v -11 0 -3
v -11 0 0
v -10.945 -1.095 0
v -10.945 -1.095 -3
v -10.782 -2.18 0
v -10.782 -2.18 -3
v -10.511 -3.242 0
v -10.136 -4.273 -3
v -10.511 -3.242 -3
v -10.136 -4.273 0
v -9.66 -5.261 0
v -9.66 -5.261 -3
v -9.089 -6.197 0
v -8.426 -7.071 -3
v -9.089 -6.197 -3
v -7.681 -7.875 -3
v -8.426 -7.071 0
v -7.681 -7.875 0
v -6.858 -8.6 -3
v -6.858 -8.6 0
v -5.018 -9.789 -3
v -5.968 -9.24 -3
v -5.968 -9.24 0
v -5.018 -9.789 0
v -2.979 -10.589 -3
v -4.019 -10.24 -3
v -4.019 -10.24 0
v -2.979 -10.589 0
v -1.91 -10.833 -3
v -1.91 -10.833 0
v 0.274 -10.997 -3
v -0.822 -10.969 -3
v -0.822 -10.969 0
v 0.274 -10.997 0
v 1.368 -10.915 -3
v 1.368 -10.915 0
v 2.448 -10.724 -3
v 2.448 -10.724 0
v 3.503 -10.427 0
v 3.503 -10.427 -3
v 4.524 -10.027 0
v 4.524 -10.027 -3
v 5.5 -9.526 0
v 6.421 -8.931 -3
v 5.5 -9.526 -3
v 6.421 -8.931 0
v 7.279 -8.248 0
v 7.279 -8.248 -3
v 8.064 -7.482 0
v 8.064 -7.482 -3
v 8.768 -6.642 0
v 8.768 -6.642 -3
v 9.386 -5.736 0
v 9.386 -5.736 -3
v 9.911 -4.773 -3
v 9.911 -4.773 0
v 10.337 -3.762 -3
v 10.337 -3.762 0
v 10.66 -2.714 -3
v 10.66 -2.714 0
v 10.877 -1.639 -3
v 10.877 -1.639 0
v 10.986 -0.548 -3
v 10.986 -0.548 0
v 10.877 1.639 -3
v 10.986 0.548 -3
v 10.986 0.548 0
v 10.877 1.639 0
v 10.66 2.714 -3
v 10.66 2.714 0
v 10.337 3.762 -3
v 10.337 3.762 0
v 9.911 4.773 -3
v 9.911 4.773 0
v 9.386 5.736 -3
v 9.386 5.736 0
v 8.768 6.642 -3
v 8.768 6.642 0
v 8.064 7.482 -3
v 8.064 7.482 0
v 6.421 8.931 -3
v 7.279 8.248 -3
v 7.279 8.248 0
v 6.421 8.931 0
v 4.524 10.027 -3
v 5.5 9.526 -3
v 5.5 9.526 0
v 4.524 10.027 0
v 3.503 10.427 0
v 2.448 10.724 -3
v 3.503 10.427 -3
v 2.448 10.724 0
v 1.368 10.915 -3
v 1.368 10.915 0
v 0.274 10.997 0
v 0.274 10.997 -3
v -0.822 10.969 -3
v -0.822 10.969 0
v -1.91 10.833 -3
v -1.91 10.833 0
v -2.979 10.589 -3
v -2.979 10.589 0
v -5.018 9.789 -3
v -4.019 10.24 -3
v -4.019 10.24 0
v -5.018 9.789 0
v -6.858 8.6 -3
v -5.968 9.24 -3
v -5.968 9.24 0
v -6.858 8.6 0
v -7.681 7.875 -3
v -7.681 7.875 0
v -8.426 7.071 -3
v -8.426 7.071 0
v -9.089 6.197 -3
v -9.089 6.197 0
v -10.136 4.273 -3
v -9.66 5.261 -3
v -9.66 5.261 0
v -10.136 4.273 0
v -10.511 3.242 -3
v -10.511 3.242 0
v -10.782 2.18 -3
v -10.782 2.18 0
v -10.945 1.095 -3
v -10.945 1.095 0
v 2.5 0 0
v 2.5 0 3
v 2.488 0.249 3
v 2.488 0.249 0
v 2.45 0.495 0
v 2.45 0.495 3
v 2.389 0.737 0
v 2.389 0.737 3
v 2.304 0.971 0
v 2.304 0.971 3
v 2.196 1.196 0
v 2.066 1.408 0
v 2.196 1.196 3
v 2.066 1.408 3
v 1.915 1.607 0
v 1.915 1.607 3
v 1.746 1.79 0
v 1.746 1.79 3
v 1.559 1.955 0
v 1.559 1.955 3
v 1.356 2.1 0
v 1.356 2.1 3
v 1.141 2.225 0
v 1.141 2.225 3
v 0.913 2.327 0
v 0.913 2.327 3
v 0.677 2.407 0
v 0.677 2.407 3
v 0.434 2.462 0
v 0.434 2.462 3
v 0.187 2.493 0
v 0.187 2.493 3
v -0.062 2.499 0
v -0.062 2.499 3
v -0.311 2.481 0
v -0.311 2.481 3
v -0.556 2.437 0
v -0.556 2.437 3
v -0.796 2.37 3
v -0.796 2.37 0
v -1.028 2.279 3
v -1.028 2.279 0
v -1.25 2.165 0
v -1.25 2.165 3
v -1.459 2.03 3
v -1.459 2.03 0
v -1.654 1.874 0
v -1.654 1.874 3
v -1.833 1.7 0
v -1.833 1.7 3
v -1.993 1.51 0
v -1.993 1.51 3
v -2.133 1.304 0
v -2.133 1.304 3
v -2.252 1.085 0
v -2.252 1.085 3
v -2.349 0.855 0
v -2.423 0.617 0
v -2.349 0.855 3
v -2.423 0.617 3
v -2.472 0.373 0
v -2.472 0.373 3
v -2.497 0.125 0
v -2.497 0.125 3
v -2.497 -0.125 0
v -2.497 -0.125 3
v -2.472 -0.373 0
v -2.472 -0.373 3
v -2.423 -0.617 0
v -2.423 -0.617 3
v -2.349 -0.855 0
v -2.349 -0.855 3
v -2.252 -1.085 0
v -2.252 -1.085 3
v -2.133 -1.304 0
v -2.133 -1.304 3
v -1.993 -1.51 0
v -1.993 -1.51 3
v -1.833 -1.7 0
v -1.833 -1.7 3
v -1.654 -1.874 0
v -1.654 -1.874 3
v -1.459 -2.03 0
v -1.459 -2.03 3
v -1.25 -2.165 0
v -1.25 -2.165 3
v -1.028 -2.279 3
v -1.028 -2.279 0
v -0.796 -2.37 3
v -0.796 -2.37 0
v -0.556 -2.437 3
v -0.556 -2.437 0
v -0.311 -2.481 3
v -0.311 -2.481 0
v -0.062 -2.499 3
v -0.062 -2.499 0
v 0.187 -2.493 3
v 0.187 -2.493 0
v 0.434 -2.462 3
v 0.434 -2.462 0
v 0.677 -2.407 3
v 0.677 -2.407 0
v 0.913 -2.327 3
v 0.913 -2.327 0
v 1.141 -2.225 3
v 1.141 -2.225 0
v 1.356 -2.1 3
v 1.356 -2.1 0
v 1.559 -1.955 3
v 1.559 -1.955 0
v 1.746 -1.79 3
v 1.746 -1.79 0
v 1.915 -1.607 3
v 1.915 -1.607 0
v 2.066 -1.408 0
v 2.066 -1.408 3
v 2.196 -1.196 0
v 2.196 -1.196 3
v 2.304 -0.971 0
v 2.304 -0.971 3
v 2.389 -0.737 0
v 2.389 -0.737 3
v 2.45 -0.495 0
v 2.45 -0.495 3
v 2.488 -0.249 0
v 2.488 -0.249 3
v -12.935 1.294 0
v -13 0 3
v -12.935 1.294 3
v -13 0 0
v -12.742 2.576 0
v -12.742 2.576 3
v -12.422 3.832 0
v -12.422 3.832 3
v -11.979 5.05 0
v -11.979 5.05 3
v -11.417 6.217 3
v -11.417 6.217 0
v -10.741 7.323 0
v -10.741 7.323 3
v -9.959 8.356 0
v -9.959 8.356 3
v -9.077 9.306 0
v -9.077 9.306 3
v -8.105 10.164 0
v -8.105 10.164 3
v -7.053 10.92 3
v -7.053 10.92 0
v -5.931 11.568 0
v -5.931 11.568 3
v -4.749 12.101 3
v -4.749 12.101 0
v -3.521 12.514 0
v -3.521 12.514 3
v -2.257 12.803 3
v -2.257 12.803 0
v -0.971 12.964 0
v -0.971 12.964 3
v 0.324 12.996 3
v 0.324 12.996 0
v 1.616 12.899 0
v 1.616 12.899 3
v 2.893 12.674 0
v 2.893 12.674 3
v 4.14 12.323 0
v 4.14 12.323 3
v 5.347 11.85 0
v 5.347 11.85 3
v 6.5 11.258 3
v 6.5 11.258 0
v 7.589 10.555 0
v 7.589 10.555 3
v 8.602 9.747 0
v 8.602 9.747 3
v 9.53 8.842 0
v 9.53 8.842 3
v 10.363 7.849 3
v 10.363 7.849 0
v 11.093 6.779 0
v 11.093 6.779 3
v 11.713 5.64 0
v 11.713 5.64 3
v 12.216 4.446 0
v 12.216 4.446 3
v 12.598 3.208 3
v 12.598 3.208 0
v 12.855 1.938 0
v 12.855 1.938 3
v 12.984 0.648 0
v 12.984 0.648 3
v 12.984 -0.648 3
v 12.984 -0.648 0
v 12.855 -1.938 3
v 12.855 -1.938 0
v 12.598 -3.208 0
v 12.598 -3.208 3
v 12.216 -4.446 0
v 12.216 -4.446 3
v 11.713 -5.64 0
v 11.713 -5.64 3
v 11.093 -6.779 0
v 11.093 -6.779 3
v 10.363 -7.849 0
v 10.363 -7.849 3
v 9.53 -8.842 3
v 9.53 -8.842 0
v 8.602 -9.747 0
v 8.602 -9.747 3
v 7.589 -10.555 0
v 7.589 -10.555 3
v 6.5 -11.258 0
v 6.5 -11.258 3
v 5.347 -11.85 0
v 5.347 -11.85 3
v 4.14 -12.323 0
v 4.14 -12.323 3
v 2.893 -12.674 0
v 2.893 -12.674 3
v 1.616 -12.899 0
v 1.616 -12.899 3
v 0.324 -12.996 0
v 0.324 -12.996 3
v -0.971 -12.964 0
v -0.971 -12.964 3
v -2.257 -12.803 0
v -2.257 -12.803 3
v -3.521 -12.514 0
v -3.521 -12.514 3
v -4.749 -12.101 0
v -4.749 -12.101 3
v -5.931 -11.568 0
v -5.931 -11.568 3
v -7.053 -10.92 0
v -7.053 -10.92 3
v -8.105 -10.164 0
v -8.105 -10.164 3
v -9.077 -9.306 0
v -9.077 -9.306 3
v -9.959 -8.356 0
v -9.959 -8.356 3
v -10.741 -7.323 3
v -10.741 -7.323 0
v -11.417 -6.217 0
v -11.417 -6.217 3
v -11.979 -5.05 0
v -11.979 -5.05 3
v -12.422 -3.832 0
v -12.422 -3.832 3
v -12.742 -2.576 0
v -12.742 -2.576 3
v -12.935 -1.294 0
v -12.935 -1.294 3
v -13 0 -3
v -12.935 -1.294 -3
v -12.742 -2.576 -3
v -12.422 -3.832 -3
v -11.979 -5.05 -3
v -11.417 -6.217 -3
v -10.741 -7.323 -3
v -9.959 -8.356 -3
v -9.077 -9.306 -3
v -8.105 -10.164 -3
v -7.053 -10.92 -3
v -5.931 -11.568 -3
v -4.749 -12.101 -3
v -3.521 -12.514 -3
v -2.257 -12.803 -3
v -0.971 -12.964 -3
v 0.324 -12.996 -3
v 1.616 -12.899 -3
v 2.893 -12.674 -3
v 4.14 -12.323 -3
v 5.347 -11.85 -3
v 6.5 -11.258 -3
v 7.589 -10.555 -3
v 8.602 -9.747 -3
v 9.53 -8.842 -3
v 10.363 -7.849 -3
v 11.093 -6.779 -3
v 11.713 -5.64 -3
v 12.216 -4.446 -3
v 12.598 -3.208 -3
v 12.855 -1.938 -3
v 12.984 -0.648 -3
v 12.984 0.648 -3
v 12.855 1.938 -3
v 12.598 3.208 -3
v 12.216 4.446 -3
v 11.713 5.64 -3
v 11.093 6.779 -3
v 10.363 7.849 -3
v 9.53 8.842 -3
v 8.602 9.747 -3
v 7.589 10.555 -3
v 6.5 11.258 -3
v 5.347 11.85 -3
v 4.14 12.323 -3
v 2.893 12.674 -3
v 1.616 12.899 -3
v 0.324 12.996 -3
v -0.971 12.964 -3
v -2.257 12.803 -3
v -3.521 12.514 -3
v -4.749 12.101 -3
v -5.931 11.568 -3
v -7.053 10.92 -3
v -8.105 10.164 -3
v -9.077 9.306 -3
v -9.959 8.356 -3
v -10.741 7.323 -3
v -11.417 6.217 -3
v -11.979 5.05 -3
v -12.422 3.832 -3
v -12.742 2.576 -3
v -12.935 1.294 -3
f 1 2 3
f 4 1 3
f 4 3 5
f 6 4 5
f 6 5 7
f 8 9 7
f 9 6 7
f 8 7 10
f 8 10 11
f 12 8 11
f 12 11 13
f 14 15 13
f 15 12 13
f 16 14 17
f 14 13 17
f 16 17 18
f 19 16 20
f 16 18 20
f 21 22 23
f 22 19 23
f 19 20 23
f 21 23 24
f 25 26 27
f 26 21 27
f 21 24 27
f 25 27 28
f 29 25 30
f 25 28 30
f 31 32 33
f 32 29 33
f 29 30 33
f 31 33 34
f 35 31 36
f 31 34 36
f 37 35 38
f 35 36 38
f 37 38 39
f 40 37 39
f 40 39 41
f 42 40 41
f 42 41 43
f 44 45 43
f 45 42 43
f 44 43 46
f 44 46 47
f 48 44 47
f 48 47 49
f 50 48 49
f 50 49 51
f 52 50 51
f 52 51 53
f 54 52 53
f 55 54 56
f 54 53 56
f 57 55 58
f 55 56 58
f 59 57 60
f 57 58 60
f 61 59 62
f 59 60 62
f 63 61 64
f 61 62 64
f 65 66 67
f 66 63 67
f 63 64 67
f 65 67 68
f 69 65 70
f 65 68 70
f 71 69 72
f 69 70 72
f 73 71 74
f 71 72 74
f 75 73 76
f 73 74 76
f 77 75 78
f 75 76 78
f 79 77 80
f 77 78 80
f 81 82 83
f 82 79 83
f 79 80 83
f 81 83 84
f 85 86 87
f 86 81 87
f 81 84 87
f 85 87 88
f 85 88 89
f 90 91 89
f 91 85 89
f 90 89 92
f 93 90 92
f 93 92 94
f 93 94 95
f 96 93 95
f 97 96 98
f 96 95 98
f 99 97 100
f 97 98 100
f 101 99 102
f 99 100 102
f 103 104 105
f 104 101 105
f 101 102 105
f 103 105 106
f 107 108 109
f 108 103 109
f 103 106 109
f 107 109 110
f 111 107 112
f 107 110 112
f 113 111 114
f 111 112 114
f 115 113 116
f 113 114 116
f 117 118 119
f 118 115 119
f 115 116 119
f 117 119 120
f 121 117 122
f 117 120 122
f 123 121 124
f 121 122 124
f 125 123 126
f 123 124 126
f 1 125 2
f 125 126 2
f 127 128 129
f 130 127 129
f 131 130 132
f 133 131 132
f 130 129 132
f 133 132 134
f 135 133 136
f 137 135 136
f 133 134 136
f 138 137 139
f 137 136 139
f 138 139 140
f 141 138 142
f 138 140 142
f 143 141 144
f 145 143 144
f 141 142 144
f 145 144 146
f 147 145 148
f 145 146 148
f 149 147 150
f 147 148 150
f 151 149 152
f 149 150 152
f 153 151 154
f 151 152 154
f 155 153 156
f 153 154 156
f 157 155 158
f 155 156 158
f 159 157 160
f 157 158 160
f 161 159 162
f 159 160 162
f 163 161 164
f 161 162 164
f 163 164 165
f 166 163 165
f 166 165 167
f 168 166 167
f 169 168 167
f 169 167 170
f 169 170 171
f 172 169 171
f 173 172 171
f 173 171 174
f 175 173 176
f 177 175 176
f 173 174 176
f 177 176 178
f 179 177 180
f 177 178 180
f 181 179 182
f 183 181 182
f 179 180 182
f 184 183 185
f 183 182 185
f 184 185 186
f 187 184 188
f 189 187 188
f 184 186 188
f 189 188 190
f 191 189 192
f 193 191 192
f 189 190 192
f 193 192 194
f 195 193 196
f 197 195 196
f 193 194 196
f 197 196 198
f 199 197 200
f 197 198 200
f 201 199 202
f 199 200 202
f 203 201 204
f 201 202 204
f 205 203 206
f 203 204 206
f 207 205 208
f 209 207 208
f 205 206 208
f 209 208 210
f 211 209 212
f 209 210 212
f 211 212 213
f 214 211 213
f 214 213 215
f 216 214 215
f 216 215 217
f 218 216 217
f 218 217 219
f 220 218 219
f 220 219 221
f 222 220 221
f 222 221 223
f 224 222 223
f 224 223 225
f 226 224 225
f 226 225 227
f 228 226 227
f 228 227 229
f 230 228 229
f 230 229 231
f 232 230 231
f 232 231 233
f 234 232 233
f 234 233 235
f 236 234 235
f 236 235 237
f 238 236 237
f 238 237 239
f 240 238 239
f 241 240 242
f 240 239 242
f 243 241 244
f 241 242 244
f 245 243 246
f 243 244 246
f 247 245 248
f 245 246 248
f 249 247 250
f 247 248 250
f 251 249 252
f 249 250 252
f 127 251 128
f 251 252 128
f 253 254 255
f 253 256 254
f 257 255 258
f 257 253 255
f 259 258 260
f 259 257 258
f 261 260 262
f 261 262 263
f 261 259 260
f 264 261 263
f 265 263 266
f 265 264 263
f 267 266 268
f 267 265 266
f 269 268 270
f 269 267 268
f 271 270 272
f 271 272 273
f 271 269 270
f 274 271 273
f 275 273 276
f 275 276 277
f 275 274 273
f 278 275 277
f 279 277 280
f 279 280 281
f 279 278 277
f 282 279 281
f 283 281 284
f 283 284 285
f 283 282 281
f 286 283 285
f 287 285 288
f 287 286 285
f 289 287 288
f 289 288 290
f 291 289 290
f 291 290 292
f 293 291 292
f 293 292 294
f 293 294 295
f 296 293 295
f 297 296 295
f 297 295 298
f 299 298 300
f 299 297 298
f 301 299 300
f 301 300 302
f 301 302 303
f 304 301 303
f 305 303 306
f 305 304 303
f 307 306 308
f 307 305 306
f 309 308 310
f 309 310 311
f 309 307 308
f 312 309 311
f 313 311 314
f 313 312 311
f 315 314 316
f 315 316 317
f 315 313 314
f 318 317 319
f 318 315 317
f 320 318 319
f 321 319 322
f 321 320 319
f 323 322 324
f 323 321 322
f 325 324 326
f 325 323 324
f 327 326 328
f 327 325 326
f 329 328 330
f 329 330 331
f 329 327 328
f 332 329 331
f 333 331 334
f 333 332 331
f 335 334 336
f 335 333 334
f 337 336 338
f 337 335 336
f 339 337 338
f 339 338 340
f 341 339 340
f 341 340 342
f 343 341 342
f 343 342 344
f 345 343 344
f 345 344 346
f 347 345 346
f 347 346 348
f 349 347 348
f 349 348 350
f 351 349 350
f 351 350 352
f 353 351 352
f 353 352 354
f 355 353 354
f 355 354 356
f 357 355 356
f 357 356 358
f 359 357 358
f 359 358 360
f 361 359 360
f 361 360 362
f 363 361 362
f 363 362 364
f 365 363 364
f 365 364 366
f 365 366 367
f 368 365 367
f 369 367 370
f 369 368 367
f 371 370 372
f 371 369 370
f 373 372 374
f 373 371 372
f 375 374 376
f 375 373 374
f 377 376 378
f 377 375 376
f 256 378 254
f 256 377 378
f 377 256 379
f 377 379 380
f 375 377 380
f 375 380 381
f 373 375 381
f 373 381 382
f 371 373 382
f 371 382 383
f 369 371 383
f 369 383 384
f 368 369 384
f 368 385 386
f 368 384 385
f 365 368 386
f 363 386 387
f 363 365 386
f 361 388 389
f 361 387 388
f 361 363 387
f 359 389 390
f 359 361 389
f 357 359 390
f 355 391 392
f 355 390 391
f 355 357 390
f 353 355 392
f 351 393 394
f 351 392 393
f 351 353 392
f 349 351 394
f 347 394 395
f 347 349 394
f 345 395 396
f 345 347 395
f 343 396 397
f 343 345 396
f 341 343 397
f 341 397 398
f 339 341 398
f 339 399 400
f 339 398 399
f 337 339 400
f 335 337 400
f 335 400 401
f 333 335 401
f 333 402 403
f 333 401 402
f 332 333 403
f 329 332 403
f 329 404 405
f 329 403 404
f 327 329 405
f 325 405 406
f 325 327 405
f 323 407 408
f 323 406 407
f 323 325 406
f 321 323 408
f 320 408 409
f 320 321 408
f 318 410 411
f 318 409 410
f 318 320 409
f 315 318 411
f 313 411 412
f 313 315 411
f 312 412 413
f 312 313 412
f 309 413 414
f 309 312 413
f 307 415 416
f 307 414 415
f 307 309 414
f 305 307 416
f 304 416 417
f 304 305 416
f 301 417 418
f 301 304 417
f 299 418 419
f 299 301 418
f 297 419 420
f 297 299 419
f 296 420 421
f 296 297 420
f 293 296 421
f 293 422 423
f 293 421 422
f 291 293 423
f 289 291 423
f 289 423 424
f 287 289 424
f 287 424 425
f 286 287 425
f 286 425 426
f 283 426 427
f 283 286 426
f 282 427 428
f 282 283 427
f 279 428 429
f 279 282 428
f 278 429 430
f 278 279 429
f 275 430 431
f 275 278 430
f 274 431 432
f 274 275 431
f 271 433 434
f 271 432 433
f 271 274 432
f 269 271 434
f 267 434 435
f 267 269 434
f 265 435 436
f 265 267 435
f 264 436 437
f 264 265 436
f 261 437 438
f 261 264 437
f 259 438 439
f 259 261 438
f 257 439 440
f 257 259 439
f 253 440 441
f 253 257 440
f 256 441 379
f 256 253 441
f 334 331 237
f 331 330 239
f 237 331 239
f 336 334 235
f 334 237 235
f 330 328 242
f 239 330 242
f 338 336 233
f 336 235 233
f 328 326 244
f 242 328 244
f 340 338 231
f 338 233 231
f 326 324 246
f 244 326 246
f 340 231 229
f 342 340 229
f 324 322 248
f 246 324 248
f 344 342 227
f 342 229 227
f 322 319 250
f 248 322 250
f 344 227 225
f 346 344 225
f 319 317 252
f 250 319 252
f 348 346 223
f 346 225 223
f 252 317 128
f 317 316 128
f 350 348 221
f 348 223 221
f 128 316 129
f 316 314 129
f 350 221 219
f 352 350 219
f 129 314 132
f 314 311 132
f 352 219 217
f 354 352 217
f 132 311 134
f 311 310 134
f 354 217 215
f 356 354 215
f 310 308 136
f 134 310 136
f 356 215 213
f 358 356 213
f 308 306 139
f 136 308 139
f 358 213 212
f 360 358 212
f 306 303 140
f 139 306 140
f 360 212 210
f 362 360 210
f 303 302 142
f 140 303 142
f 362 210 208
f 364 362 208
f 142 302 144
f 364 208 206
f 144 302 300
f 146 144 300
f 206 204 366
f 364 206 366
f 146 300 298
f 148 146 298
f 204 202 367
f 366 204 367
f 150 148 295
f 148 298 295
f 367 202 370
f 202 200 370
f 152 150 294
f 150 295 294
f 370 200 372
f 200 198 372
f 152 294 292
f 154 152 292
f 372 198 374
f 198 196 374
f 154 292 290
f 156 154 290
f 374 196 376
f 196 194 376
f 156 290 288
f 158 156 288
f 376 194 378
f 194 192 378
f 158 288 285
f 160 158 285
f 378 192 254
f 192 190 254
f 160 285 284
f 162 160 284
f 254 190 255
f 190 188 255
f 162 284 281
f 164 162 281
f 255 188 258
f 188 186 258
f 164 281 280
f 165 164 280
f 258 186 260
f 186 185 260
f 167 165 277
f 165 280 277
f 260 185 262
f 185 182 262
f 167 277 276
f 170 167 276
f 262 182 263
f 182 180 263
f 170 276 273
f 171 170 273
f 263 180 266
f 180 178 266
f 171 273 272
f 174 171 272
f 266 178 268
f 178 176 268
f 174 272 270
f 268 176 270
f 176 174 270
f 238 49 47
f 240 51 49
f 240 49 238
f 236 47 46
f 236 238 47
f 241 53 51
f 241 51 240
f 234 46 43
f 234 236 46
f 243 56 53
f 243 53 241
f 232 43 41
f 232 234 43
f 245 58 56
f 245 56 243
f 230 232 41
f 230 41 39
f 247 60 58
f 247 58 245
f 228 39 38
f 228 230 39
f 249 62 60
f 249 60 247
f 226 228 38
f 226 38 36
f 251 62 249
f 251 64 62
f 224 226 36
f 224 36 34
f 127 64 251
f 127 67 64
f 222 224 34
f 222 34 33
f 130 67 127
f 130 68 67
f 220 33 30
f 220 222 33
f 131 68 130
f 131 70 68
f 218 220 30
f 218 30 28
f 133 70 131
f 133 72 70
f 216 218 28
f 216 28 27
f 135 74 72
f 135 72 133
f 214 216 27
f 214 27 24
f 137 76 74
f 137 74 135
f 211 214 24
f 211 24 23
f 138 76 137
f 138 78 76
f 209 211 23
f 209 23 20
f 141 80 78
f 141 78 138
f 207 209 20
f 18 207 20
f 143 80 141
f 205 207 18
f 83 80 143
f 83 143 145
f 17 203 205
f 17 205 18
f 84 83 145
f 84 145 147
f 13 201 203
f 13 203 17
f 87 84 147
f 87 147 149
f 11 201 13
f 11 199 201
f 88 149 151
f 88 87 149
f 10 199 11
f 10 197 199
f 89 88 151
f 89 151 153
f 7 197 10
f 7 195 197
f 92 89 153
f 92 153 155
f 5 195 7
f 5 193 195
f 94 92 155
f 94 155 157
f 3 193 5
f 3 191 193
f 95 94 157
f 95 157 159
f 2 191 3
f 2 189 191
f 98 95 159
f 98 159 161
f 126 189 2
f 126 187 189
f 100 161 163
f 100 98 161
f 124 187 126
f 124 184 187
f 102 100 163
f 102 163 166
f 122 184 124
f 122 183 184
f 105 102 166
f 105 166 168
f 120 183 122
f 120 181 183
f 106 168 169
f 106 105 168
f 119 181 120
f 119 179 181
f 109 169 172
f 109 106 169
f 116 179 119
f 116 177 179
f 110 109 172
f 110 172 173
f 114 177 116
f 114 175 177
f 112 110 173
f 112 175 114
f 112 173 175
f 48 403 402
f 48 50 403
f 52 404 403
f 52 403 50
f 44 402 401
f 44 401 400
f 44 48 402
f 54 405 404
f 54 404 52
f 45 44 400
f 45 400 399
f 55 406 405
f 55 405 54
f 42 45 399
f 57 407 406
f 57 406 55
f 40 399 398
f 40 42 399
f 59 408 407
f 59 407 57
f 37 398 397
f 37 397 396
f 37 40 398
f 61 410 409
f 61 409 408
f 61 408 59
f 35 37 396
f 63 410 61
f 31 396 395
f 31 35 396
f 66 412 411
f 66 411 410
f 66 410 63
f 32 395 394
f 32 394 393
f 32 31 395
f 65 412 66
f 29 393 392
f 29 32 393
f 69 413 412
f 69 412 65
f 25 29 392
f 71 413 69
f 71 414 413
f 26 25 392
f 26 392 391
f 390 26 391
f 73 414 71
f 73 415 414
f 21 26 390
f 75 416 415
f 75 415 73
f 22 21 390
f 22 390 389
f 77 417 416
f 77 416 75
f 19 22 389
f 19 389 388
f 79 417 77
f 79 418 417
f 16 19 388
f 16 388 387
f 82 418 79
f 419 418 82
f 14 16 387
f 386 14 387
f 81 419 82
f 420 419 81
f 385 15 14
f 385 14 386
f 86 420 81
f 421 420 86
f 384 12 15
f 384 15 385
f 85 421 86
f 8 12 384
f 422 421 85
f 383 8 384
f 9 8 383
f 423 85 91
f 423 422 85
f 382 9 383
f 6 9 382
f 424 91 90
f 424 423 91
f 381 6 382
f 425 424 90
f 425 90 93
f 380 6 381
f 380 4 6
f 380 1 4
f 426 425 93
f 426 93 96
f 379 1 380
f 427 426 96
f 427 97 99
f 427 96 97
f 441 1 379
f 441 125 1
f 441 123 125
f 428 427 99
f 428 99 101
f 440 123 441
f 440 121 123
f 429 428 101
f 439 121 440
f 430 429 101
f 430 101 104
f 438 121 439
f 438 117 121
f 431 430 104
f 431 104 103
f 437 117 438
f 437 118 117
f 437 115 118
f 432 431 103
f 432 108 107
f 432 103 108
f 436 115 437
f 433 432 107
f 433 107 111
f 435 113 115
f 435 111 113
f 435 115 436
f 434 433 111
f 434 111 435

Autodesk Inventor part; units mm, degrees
ref_plane "YZ Plane" through (0, 0, 0) normal (1, 0, 0) x (0, 1, 0)
ref_plane "XZ Plane" through (0, 0, 0) normal (0, 1, 0) x (-1, 0, 0)
ref_plane "XY Plane" through (0, 0, 0) normal (0, 0, 1) x (1, 0, 0)
sketch "Sketch1" plane through (0, 0, 0) normal (0, 0, 1) x (1, 0, 0)
  circle A0 centre (0, 0) radius 10.75 projected
  point P0 (0, 0)
extrude "Extrusion1" add sketch "Sketch1" along normal blind 3
sketch "Sketch2" plane through (0, 0, 3) normal (0, 0, 1) x (1, 0, 0)
  circle A0 centre (0, 0) radius 10.75 projected
  circle A1 centre (0, 0) radius 2.5
  dimension "d2" = 5
extrude "Extrusion2" cut sketch "Sketch2" against normal blind 3 contours A1
sketch "Sketch3" plane through (0, 0, 0) normal (0, 0, -1) x (-1, 0, 0)
  circle A0 centre (0, 0) radius 10.75 projected
  circle A1 centre (0, 0) radius 13
  dimension "d5" = 26
extrude "Extrusion3" add sketch "Sketch3" against normal up to surface (3 mm away)
sketch "Sketch4" plane through (0, 0, 0) normal (0, 0, -1) x (-1, 0, 0)
  circle A0 centre (0, 0) radius 13 projected
  circle A1 centre (0, 0) radius 2.5 projected
  circle A2 centre (0, 0) radius 11
  dimension "d8" = 22
extrude "Extrusion4" add sketch "Sketch4" along normal blind 3 contours A0
properties part number "HubCover"
